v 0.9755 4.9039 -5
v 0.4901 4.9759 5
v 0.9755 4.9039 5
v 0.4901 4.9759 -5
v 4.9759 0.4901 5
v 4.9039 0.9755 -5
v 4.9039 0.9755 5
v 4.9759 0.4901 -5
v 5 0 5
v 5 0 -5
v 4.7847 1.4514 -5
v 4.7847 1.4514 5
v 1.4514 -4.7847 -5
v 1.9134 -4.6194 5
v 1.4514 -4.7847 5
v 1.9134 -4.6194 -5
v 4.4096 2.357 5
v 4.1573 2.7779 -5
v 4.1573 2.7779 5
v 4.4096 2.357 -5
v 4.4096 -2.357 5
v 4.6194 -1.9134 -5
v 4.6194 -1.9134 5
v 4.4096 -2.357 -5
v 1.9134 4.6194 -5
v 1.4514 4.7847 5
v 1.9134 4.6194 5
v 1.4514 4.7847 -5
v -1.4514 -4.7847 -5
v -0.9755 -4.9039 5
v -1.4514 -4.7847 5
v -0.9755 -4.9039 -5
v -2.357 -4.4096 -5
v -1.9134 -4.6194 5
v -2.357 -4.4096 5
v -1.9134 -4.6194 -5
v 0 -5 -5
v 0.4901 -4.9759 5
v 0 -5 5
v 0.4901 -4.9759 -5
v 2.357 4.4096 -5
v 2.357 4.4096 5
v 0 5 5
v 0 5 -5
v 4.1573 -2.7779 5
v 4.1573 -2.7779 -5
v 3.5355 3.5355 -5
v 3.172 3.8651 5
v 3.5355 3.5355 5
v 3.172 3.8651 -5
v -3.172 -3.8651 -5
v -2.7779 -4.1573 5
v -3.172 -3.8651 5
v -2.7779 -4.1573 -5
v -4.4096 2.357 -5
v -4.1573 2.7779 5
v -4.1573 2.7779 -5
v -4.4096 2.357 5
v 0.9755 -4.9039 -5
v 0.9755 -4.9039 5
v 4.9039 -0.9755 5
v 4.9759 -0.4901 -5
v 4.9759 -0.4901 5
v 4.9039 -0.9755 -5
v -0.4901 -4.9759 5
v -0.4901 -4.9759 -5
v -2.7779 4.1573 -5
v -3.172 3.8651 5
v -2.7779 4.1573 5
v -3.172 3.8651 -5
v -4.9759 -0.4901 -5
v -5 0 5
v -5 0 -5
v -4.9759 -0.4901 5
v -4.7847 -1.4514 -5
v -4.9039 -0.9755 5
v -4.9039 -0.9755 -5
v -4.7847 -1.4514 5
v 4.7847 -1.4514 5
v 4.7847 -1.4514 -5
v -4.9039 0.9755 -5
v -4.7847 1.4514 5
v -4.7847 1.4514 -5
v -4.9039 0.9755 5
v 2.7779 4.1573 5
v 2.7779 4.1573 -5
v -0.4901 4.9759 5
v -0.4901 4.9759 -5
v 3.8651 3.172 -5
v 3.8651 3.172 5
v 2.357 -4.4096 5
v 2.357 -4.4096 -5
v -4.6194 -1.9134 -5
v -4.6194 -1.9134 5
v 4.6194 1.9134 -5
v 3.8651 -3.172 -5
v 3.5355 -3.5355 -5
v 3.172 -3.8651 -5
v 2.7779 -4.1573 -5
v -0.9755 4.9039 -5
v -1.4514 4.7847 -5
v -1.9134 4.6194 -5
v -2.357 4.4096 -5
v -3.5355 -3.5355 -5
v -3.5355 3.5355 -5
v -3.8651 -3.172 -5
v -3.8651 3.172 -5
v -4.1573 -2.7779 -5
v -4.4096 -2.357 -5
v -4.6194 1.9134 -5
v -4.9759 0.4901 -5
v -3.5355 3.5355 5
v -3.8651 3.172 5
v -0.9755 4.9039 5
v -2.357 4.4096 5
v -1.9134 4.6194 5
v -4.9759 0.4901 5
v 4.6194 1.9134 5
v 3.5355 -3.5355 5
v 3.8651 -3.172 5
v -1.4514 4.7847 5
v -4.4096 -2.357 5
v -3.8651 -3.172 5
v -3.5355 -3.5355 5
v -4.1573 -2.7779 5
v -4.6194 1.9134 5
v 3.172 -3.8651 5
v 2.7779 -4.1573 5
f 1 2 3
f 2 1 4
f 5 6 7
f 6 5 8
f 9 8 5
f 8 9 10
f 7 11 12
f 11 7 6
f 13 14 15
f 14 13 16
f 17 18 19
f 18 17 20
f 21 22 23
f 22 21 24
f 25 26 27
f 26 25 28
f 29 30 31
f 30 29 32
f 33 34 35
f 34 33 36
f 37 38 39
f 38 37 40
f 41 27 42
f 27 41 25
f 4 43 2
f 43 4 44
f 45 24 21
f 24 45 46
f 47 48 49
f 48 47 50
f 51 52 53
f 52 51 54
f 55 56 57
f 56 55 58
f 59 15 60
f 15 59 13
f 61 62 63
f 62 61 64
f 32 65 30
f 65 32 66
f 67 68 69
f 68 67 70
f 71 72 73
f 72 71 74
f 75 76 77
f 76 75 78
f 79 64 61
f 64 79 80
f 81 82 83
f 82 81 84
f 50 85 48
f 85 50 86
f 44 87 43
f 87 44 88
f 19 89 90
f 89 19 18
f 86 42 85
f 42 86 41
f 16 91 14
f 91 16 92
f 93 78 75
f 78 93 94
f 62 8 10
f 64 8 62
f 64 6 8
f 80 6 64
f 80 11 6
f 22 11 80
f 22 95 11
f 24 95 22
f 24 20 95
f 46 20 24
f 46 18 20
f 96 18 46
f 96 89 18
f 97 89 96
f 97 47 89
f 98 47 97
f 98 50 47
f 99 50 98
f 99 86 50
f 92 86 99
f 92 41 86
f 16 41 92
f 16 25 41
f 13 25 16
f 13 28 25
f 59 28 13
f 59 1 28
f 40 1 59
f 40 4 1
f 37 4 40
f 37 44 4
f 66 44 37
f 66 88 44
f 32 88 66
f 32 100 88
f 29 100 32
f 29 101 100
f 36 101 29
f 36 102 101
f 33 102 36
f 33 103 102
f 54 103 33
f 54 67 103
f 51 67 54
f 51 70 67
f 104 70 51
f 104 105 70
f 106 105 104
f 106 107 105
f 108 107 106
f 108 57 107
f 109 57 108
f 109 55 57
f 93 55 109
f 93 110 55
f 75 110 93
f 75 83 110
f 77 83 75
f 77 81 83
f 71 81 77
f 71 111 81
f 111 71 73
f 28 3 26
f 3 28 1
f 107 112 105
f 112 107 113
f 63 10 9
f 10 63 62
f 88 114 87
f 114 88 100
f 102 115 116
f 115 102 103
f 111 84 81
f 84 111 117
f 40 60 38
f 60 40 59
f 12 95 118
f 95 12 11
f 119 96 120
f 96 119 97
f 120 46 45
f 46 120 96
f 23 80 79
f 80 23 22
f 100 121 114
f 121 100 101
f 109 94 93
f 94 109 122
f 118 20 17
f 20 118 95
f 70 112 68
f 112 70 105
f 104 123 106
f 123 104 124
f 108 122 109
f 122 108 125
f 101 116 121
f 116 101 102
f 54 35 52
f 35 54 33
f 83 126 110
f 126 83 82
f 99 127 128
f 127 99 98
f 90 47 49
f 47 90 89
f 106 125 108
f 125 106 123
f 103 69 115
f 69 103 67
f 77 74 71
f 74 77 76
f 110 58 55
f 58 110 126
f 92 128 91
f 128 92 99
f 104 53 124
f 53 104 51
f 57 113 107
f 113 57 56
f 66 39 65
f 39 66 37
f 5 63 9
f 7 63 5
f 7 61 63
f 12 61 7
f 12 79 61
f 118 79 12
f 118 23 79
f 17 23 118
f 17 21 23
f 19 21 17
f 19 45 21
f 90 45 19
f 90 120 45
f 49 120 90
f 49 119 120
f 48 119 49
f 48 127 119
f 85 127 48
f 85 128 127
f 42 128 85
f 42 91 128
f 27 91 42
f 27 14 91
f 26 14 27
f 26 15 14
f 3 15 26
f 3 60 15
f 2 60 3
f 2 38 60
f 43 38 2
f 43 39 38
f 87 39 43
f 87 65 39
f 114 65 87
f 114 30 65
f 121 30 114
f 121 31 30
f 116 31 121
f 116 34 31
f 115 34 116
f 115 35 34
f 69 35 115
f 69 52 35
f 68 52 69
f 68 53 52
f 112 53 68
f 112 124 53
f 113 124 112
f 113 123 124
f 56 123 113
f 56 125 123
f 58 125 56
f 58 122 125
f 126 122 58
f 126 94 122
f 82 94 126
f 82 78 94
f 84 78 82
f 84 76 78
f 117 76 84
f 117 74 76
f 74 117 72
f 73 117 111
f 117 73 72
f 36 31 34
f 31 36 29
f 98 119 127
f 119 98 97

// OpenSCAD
$fn = 64;

/*
    all units are in millimeters
*/

// set these to true or false depending on wheter you want to have the tube the lid or both
create_tube = true;
create_lid = true;

//the vertical space inside of the lid
lid_inner_height = 20.0;

//the vertical space inside of the tube
tube_inner_height = 50.0;

//the inner diameter of the tube and lid
inner_diameter = 10.0;

/*
the length of the thread 
15mm should be good for most scenarios
make sure that the thread length is always less than the length of the tube and lid.
*/
thread_length = 15.0;


/*
    If you change anything below here the program might stop working (correctly).
*/

assert(tube_inner_height > thread_length, "The tubes's inner height needs to be greater than the thread length.");
assert(lid_inner_height > thread_length, "The lid's inner height needs to be greater than the thread length.");


module tube() {
    //outer tube
    cylinder(d=inner_diameter, h=10, center = true);
    //thread

    //inner space
}

module lid(){
    //outer hull
    cylinder(d=inner_diameter, h=10, center = true);
    //thread

    //inner space
}

if(create_tube){
    tube();
}

if(create_lid){
    translate([0, 0, 0]) lid();
}
